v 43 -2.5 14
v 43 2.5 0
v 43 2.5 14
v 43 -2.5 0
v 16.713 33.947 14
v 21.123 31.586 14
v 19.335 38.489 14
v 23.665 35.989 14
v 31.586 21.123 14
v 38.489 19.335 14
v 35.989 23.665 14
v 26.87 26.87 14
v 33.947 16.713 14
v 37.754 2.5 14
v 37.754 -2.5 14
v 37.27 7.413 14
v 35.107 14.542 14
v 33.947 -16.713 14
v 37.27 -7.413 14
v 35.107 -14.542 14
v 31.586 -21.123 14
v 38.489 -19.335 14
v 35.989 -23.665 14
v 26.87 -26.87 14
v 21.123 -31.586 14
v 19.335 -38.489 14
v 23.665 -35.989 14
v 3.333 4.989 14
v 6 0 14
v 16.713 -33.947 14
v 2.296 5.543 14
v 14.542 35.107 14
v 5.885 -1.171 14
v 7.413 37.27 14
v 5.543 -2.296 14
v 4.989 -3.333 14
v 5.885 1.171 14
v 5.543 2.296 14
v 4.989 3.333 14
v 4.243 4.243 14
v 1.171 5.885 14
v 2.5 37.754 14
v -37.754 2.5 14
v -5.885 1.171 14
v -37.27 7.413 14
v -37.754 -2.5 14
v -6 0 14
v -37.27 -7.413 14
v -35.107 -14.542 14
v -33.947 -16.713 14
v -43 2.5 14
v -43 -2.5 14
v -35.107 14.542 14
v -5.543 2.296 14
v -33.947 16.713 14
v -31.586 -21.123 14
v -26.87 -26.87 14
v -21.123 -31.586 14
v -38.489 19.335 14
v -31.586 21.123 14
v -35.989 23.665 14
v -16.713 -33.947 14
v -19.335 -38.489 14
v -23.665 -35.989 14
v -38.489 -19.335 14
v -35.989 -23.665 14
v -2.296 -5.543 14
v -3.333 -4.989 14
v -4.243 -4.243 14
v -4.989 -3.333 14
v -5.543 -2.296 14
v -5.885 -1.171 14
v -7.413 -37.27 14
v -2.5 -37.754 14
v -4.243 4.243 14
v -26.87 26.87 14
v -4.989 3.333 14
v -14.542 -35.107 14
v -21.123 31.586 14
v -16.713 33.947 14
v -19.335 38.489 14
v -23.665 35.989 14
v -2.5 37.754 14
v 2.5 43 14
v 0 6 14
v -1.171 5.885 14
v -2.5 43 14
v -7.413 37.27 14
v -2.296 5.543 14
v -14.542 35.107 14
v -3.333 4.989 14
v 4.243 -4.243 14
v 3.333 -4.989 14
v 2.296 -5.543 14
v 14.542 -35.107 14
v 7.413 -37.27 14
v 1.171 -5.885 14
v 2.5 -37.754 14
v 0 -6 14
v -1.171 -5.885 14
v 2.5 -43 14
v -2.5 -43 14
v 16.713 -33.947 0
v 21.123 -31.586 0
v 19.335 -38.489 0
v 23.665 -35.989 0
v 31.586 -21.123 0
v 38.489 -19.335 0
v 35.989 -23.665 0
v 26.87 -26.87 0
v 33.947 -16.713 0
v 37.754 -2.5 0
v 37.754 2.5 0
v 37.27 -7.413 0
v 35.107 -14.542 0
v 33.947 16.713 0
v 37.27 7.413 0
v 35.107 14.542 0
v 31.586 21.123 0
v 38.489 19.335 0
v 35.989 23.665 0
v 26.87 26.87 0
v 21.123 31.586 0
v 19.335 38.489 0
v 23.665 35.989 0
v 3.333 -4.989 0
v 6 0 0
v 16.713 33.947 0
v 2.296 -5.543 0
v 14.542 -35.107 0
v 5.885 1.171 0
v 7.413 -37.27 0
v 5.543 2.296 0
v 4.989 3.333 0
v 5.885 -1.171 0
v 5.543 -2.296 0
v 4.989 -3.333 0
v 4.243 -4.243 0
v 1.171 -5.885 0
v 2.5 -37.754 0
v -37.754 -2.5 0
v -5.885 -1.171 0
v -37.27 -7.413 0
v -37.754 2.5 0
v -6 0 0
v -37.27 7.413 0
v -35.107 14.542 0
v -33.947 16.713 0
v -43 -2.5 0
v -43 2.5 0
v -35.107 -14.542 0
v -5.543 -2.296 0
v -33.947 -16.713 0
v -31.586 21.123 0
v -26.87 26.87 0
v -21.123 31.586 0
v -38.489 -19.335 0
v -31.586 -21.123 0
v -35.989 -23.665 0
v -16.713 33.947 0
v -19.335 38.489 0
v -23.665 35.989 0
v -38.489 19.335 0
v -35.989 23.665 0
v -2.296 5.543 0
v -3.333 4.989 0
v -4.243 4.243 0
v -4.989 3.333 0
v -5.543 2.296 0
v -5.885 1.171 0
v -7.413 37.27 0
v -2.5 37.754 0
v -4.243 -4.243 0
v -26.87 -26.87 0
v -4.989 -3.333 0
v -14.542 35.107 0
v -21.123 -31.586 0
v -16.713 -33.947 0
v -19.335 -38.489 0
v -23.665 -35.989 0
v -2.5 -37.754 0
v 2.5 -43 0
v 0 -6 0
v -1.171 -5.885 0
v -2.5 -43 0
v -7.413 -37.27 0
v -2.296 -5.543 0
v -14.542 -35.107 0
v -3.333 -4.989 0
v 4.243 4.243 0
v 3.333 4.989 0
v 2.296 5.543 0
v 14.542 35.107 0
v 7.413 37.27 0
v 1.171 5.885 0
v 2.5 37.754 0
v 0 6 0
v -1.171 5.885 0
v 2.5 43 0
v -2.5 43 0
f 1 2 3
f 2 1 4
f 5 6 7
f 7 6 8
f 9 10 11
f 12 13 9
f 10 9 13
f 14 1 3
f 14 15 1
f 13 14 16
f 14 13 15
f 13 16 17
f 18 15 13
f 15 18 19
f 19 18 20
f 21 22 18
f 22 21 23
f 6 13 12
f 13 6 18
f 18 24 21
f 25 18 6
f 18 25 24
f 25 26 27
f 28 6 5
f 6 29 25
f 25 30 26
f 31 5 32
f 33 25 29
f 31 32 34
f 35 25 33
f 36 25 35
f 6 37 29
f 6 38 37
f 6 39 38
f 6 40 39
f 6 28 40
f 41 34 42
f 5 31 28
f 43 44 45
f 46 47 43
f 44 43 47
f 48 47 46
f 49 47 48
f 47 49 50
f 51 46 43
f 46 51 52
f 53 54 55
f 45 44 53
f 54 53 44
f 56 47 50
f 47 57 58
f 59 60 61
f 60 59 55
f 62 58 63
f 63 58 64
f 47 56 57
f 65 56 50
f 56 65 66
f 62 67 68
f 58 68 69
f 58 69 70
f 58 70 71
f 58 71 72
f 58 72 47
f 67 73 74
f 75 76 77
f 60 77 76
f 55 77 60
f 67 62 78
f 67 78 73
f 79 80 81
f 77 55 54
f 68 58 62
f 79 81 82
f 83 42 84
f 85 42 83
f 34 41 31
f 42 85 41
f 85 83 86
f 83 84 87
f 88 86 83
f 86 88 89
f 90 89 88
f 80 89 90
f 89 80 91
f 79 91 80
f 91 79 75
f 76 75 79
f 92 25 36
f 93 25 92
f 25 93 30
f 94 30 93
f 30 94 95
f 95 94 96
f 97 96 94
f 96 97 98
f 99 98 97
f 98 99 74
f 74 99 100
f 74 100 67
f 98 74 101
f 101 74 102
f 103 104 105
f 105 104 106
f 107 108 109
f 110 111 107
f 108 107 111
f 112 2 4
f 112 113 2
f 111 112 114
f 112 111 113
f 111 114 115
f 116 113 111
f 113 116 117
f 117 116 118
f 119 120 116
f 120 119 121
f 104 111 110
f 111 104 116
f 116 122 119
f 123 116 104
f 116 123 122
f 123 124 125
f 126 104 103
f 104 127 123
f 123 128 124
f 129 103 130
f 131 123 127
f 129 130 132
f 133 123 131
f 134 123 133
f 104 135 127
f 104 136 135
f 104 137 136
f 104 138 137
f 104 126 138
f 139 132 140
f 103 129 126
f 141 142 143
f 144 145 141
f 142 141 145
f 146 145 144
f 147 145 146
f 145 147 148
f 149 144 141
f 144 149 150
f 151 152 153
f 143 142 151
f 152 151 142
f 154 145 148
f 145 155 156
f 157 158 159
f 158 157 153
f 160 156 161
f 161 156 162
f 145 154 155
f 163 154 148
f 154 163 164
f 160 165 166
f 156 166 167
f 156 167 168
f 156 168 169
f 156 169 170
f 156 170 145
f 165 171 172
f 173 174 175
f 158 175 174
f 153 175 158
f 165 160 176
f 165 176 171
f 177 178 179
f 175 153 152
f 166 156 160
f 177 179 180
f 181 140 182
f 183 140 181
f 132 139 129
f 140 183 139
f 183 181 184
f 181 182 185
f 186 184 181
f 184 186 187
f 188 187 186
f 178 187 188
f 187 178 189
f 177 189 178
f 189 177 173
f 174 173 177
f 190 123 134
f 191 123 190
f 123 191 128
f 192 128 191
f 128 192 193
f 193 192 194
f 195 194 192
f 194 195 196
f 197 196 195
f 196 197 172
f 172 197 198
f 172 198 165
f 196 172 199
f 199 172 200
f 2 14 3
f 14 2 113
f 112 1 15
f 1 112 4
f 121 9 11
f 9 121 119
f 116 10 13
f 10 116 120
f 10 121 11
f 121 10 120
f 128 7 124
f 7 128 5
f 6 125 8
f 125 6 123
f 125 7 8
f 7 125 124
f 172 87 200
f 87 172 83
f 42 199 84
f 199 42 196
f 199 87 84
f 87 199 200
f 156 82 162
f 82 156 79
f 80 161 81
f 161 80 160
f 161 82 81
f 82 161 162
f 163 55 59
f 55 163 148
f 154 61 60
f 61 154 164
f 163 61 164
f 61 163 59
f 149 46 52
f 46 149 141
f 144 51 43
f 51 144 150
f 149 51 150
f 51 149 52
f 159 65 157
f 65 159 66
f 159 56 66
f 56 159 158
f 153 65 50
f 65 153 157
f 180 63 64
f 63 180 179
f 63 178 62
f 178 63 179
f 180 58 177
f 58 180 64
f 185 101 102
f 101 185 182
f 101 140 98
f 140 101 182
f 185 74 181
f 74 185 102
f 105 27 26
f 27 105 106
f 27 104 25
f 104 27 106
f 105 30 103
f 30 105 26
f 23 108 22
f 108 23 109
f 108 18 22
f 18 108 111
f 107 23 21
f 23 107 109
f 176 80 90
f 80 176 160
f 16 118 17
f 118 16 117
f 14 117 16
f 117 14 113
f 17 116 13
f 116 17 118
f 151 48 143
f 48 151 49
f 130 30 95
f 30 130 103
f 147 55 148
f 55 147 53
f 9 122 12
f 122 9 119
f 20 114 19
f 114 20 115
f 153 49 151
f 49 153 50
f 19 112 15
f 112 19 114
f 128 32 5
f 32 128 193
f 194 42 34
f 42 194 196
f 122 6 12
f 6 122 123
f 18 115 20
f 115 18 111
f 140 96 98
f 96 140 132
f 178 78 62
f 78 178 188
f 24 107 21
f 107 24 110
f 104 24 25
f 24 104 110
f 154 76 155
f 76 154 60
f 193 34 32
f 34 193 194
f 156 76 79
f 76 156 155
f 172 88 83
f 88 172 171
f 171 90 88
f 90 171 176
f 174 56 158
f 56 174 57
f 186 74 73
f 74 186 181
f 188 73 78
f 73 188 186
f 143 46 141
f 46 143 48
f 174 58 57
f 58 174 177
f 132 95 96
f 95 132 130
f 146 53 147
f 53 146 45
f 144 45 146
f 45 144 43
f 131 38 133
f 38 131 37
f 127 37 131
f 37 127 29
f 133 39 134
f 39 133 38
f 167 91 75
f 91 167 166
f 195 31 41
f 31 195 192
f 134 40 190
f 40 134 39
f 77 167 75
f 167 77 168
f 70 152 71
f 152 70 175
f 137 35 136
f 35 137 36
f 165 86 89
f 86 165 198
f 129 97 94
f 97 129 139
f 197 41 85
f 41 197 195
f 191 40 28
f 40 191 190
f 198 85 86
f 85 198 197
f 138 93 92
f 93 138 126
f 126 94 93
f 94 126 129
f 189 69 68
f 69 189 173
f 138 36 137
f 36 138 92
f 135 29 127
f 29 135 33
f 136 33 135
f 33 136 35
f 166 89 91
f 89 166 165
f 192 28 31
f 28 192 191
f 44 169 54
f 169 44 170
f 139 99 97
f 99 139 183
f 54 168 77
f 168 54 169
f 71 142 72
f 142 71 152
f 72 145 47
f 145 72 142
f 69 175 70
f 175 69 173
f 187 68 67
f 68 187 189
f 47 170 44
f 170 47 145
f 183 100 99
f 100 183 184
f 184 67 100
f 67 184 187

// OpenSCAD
$fn = 32;

// ----------------------------------------------------------------------
// Spur blank: bored gear blank
// ----------------------------------------------------------------------

// --- parameters (mm) ---
disc_r = 38;              // blank root radius
disc_t = 14;              // blank thickness
n_teeth = 12;             // stub tooth count
tooth_w = 5;              // tooth width at the root
tooth_h = 5;              // tooth height above the root
bore_r = 6;               // central bore radius

out_r = disc_r + tooth_h;  // tip radius
bbox_x = 86.0;  // measured width over the teeth
bbox_y = 86.0;  // measured depth over the teeth

difference() {
union() {
  cylinder(r = disc_r, h = disc_t);
  for (i = [0 : n_teeth - 1])
    rotate([0, 0, i * 360 / n_teeth])
      translate([disc_r - 1, -tooth_w / 2, 0])
        cube([tooth_h + 1, tooth_w, disc_t]);
}
  translate([0, 0, -1]) cylinder(r = bore_r, h = disc_t + 2);
}
